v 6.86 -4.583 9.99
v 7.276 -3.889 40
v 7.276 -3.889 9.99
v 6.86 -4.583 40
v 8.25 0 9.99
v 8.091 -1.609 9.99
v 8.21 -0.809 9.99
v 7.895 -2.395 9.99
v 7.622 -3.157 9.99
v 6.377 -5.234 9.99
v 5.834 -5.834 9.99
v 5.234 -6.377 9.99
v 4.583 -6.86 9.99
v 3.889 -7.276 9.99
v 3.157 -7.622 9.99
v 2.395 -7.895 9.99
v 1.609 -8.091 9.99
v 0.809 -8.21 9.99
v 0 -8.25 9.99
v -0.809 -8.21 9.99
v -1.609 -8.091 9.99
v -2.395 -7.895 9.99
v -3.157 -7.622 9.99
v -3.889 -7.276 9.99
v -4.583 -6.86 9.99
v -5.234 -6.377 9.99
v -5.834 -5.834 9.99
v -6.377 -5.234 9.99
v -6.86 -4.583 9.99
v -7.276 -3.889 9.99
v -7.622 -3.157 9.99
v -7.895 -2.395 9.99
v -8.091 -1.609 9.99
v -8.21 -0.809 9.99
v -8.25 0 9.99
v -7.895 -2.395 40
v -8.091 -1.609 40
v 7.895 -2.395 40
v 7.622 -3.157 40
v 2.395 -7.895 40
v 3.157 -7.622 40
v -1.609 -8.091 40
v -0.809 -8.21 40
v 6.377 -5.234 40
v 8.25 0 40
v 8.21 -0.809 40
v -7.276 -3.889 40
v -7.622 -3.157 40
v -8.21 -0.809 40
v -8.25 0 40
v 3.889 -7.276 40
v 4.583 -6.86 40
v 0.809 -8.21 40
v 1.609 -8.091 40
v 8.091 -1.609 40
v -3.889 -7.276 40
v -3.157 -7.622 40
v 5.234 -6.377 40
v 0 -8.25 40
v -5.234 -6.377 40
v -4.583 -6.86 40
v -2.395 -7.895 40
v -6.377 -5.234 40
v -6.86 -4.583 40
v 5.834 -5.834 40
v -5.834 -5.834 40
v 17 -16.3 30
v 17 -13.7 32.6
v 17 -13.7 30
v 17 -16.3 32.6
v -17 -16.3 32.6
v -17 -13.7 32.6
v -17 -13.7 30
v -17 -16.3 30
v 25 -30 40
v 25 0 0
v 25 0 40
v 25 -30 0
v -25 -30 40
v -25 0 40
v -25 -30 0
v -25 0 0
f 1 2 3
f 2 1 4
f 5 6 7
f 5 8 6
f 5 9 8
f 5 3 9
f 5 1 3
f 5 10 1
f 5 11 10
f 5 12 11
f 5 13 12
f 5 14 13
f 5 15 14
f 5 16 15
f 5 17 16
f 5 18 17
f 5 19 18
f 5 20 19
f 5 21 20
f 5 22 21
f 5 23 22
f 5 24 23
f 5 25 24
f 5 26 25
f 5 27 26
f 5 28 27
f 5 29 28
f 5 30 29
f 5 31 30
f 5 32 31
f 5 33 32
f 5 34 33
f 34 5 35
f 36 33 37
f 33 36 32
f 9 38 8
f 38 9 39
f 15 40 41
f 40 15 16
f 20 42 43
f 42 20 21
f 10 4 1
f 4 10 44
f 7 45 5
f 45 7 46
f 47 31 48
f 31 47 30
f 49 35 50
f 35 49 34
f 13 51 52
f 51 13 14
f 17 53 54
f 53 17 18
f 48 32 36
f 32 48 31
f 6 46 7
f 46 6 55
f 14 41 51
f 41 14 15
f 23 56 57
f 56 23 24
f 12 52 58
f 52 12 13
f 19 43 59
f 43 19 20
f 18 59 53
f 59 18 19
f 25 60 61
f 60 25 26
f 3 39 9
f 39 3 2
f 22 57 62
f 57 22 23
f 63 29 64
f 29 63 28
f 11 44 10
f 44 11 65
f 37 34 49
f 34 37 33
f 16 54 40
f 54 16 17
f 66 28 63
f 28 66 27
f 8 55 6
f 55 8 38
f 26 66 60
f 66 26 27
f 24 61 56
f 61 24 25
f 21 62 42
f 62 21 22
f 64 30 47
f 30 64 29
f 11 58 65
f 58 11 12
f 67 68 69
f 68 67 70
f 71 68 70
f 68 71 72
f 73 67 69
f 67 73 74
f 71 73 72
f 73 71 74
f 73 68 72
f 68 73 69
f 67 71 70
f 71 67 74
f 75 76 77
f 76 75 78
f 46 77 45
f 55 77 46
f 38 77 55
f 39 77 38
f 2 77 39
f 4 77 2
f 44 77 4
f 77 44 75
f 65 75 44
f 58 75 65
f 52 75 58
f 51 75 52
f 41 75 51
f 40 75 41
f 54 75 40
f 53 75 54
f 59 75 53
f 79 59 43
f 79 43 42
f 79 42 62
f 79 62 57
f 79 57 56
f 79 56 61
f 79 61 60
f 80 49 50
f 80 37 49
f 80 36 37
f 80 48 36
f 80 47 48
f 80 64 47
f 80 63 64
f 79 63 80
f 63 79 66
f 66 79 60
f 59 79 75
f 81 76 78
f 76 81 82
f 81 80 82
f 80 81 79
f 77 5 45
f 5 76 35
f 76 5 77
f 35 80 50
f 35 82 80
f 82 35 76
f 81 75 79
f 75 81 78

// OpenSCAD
// Built by bench/smallmodels/features/compiler.py from a list of features.
$fn = 64;
difference() {
  union() {
    translate([0, -15, 0]) translate([-25, -15, 0]) cube([50, 30, 40]);
  }
  union() {
    translate([0, 0, 9.99]) rotate([0, 0, 0]) cylinder(d = 16.5, h = 30.02);
    translate([0, -15, 30]) rotate([0, 0, 0]) translate([-17, -1.3, 0]) cube([34, 2.6, 2.6]);
  }
}
